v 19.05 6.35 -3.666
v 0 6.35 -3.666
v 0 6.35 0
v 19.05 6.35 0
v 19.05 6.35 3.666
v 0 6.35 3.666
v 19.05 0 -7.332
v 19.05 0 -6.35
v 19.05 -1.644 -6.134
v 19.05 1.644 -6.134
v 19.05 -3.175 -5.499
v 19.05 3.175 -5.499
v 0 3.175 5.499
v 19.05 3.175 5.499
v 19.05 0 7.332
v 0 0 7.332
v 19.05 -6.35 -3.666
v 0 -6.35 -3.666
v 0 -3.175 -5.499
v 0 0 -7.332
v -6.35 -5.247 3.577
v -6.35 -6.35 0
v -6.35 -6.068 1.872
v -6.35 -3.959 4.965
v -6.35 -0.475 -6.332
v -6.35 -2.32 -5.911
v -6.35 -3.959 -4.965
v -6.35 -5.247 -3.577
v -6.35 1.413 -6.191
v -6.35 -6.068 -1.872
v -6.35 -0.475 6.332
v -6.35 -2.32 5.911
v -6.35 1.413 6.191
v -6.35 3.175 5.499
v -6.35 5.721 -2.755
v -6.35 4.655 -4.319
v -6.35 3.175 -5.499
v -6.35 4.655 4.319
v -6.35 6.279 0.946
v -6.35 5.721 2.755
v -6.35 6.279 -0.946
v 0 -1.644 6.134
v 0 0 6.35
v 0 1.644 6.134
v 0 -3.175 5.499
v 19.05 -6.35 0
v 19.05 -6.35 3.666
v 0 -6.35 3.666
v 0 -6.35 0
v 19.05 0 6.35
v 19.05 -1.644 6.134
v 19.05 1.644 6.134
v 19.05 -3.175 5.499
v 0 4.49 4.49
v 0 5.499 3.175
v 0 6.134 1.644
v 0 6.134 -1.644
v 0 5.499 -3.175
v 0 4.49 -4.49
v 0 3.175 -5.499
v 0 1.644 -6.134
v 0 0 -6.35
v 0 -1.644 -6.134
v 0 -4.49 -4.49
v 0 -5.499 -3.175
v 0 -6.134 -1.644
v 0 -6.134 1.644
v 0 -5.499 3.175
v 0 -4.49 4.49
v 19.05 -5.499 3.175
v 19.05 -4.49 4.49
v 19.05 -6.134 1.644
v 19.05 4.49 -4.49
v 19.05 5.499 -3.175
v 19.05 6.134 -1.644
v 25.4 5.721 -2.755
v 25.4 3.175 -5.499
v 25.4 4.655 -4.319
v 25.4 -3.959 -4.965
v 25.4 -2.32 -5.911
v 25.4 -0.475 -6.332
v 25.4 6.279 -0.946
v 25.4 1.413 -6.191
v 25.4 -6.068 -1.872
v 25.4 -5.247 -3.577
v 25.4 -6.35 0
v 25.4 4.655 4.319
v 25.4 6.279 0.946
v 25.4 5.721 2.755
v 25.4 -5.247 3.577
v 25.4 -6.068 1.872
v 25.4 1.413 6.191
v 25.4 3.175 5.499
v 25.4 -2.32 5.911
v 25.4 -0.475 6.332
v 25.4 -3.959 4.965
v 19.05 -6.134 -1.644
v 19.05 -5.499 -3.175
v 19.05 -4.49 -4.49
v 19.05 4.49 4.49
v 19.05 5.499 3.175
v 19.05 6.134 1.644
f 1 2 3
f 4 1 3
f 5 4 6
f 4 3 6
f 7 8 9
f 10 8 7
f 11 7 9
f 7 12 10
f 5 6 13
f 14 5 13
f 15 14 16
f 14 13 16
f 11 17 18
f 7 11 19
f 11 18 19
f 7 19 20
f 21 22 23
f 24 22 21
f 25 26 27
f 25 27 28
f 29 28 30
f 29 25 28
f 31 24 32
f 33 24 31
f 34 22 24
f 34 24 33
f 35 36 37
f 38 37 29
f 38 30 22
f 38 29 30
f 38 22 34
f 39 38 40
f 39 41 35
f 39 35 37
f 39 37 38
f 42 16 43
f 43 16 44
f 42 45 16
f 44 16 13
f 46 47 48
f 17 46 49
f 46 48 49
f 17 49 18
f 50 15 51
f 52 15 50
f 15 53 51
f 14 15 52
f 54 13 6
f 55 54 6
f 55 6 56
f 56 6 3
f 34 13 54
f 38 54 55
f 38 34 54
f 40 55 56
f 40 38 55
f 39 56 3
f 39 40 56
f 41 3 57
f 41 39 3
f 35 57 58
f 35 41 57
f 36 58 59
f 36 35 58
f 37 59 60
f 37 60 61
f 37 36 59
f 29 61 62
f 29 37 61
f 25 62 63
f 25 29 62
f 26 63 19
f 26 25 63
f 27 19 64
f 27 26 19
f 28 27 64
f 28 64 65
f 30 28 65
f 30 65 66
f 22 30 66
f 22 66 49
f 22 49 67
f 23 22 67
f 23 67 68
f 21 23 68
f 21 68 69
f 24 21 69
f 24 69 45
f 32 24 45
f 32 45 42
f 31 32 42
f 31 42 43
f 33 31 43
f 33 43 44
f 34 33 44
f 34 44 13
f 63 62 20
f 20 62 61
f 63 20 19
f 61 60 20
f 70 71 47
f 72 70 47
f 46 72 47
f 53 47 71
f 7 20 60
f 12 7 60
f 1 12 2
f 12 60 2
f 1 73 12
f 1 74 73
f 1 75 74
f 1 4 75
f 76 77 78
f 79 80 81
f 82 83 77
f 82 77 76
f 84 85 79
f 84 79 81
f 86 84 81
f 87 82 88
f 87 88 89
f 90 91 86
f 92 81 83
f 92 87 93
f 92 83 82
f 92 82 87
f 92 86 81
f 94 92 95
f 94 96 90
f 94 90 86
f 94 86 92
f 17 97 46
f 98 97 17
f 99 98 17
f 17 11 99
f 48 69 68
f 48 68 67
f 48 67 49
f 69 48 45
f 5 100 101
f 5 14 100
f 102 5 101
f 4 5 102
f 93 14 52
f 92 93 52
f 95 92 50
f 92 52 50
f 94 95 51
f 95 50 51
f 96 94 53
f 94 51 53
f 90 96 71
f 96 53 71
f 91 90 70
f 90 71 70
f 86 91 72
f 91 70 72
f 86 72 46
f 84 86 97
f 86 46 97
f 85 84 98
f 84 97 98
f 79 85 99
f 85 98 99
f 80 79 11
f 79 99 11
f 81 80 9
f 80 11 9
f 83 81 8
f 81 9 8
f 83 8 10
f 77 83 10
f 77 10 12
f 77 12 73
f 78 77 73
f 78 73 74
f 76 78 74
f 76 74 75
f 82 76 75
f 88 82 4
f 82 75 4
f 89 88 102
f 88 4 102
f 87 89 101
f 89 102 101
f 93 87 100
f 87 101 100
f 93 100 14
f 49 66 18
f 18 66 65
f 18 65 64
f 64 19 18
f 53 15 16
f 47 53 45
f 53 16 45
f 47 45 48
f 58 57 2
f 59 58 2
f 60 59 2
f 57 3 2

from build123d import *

# Parameters (mm, degrees)
BOSS_EXTRUDE1_DEPTH = 19.05
SKETCH2_R           = 6.35
BOSS_EXTRUDE2_DEPTH = 6.35
BOSS_EXTRUDE3_START = 6.35
SKETCH3_R           = 6.35
BOSS_EXTRUDE3_DEPTH = 6.35


with BuildPart() as part:
    # Sketch1 → Boss-Extrude1 (new body)
    with BuildSketch(Plane(origin=(0, 0, 0), x_dir=(0, 0, -1), z_dir=(1, 0, 0))):
        Polygon((-3.666174209, -6.35), (3.666174209, -6.35), (7.332348419, 0), (3.666174209, 6.35), (-3.666174209, 6.35), (-7.332348419, 0), align=None)
    extrude(amount=BOSS_EXTRUDE1_DEPTH)

    # Sketch2 → Boss-Extrude2 (add)
    with BuildSketch(Plane(origin=(19.05, 0, 0), x_dir=(0, 0, -1), z_dir=(1, 0, 0))):
        with Locations(Location((0, 0, 0), (0, 0, 150))):
            Circle(SKETCH2_R)
    extrude(amount=BOSS_EXTRUDE2_DEPTH)

    # Sketch3 → Boss-Extrude3 (add)
    with BuildSketch(Plane.ZY.offset(BOSS_EXTRUDE3_START)):
        with Locations(Location((0, 0, 0), (0, 0, 30))):
            Circle(SKETCH3_R)
    extrude(amount=-BOSS_EXTRUDE3_DEPTH)


solid = part.part
